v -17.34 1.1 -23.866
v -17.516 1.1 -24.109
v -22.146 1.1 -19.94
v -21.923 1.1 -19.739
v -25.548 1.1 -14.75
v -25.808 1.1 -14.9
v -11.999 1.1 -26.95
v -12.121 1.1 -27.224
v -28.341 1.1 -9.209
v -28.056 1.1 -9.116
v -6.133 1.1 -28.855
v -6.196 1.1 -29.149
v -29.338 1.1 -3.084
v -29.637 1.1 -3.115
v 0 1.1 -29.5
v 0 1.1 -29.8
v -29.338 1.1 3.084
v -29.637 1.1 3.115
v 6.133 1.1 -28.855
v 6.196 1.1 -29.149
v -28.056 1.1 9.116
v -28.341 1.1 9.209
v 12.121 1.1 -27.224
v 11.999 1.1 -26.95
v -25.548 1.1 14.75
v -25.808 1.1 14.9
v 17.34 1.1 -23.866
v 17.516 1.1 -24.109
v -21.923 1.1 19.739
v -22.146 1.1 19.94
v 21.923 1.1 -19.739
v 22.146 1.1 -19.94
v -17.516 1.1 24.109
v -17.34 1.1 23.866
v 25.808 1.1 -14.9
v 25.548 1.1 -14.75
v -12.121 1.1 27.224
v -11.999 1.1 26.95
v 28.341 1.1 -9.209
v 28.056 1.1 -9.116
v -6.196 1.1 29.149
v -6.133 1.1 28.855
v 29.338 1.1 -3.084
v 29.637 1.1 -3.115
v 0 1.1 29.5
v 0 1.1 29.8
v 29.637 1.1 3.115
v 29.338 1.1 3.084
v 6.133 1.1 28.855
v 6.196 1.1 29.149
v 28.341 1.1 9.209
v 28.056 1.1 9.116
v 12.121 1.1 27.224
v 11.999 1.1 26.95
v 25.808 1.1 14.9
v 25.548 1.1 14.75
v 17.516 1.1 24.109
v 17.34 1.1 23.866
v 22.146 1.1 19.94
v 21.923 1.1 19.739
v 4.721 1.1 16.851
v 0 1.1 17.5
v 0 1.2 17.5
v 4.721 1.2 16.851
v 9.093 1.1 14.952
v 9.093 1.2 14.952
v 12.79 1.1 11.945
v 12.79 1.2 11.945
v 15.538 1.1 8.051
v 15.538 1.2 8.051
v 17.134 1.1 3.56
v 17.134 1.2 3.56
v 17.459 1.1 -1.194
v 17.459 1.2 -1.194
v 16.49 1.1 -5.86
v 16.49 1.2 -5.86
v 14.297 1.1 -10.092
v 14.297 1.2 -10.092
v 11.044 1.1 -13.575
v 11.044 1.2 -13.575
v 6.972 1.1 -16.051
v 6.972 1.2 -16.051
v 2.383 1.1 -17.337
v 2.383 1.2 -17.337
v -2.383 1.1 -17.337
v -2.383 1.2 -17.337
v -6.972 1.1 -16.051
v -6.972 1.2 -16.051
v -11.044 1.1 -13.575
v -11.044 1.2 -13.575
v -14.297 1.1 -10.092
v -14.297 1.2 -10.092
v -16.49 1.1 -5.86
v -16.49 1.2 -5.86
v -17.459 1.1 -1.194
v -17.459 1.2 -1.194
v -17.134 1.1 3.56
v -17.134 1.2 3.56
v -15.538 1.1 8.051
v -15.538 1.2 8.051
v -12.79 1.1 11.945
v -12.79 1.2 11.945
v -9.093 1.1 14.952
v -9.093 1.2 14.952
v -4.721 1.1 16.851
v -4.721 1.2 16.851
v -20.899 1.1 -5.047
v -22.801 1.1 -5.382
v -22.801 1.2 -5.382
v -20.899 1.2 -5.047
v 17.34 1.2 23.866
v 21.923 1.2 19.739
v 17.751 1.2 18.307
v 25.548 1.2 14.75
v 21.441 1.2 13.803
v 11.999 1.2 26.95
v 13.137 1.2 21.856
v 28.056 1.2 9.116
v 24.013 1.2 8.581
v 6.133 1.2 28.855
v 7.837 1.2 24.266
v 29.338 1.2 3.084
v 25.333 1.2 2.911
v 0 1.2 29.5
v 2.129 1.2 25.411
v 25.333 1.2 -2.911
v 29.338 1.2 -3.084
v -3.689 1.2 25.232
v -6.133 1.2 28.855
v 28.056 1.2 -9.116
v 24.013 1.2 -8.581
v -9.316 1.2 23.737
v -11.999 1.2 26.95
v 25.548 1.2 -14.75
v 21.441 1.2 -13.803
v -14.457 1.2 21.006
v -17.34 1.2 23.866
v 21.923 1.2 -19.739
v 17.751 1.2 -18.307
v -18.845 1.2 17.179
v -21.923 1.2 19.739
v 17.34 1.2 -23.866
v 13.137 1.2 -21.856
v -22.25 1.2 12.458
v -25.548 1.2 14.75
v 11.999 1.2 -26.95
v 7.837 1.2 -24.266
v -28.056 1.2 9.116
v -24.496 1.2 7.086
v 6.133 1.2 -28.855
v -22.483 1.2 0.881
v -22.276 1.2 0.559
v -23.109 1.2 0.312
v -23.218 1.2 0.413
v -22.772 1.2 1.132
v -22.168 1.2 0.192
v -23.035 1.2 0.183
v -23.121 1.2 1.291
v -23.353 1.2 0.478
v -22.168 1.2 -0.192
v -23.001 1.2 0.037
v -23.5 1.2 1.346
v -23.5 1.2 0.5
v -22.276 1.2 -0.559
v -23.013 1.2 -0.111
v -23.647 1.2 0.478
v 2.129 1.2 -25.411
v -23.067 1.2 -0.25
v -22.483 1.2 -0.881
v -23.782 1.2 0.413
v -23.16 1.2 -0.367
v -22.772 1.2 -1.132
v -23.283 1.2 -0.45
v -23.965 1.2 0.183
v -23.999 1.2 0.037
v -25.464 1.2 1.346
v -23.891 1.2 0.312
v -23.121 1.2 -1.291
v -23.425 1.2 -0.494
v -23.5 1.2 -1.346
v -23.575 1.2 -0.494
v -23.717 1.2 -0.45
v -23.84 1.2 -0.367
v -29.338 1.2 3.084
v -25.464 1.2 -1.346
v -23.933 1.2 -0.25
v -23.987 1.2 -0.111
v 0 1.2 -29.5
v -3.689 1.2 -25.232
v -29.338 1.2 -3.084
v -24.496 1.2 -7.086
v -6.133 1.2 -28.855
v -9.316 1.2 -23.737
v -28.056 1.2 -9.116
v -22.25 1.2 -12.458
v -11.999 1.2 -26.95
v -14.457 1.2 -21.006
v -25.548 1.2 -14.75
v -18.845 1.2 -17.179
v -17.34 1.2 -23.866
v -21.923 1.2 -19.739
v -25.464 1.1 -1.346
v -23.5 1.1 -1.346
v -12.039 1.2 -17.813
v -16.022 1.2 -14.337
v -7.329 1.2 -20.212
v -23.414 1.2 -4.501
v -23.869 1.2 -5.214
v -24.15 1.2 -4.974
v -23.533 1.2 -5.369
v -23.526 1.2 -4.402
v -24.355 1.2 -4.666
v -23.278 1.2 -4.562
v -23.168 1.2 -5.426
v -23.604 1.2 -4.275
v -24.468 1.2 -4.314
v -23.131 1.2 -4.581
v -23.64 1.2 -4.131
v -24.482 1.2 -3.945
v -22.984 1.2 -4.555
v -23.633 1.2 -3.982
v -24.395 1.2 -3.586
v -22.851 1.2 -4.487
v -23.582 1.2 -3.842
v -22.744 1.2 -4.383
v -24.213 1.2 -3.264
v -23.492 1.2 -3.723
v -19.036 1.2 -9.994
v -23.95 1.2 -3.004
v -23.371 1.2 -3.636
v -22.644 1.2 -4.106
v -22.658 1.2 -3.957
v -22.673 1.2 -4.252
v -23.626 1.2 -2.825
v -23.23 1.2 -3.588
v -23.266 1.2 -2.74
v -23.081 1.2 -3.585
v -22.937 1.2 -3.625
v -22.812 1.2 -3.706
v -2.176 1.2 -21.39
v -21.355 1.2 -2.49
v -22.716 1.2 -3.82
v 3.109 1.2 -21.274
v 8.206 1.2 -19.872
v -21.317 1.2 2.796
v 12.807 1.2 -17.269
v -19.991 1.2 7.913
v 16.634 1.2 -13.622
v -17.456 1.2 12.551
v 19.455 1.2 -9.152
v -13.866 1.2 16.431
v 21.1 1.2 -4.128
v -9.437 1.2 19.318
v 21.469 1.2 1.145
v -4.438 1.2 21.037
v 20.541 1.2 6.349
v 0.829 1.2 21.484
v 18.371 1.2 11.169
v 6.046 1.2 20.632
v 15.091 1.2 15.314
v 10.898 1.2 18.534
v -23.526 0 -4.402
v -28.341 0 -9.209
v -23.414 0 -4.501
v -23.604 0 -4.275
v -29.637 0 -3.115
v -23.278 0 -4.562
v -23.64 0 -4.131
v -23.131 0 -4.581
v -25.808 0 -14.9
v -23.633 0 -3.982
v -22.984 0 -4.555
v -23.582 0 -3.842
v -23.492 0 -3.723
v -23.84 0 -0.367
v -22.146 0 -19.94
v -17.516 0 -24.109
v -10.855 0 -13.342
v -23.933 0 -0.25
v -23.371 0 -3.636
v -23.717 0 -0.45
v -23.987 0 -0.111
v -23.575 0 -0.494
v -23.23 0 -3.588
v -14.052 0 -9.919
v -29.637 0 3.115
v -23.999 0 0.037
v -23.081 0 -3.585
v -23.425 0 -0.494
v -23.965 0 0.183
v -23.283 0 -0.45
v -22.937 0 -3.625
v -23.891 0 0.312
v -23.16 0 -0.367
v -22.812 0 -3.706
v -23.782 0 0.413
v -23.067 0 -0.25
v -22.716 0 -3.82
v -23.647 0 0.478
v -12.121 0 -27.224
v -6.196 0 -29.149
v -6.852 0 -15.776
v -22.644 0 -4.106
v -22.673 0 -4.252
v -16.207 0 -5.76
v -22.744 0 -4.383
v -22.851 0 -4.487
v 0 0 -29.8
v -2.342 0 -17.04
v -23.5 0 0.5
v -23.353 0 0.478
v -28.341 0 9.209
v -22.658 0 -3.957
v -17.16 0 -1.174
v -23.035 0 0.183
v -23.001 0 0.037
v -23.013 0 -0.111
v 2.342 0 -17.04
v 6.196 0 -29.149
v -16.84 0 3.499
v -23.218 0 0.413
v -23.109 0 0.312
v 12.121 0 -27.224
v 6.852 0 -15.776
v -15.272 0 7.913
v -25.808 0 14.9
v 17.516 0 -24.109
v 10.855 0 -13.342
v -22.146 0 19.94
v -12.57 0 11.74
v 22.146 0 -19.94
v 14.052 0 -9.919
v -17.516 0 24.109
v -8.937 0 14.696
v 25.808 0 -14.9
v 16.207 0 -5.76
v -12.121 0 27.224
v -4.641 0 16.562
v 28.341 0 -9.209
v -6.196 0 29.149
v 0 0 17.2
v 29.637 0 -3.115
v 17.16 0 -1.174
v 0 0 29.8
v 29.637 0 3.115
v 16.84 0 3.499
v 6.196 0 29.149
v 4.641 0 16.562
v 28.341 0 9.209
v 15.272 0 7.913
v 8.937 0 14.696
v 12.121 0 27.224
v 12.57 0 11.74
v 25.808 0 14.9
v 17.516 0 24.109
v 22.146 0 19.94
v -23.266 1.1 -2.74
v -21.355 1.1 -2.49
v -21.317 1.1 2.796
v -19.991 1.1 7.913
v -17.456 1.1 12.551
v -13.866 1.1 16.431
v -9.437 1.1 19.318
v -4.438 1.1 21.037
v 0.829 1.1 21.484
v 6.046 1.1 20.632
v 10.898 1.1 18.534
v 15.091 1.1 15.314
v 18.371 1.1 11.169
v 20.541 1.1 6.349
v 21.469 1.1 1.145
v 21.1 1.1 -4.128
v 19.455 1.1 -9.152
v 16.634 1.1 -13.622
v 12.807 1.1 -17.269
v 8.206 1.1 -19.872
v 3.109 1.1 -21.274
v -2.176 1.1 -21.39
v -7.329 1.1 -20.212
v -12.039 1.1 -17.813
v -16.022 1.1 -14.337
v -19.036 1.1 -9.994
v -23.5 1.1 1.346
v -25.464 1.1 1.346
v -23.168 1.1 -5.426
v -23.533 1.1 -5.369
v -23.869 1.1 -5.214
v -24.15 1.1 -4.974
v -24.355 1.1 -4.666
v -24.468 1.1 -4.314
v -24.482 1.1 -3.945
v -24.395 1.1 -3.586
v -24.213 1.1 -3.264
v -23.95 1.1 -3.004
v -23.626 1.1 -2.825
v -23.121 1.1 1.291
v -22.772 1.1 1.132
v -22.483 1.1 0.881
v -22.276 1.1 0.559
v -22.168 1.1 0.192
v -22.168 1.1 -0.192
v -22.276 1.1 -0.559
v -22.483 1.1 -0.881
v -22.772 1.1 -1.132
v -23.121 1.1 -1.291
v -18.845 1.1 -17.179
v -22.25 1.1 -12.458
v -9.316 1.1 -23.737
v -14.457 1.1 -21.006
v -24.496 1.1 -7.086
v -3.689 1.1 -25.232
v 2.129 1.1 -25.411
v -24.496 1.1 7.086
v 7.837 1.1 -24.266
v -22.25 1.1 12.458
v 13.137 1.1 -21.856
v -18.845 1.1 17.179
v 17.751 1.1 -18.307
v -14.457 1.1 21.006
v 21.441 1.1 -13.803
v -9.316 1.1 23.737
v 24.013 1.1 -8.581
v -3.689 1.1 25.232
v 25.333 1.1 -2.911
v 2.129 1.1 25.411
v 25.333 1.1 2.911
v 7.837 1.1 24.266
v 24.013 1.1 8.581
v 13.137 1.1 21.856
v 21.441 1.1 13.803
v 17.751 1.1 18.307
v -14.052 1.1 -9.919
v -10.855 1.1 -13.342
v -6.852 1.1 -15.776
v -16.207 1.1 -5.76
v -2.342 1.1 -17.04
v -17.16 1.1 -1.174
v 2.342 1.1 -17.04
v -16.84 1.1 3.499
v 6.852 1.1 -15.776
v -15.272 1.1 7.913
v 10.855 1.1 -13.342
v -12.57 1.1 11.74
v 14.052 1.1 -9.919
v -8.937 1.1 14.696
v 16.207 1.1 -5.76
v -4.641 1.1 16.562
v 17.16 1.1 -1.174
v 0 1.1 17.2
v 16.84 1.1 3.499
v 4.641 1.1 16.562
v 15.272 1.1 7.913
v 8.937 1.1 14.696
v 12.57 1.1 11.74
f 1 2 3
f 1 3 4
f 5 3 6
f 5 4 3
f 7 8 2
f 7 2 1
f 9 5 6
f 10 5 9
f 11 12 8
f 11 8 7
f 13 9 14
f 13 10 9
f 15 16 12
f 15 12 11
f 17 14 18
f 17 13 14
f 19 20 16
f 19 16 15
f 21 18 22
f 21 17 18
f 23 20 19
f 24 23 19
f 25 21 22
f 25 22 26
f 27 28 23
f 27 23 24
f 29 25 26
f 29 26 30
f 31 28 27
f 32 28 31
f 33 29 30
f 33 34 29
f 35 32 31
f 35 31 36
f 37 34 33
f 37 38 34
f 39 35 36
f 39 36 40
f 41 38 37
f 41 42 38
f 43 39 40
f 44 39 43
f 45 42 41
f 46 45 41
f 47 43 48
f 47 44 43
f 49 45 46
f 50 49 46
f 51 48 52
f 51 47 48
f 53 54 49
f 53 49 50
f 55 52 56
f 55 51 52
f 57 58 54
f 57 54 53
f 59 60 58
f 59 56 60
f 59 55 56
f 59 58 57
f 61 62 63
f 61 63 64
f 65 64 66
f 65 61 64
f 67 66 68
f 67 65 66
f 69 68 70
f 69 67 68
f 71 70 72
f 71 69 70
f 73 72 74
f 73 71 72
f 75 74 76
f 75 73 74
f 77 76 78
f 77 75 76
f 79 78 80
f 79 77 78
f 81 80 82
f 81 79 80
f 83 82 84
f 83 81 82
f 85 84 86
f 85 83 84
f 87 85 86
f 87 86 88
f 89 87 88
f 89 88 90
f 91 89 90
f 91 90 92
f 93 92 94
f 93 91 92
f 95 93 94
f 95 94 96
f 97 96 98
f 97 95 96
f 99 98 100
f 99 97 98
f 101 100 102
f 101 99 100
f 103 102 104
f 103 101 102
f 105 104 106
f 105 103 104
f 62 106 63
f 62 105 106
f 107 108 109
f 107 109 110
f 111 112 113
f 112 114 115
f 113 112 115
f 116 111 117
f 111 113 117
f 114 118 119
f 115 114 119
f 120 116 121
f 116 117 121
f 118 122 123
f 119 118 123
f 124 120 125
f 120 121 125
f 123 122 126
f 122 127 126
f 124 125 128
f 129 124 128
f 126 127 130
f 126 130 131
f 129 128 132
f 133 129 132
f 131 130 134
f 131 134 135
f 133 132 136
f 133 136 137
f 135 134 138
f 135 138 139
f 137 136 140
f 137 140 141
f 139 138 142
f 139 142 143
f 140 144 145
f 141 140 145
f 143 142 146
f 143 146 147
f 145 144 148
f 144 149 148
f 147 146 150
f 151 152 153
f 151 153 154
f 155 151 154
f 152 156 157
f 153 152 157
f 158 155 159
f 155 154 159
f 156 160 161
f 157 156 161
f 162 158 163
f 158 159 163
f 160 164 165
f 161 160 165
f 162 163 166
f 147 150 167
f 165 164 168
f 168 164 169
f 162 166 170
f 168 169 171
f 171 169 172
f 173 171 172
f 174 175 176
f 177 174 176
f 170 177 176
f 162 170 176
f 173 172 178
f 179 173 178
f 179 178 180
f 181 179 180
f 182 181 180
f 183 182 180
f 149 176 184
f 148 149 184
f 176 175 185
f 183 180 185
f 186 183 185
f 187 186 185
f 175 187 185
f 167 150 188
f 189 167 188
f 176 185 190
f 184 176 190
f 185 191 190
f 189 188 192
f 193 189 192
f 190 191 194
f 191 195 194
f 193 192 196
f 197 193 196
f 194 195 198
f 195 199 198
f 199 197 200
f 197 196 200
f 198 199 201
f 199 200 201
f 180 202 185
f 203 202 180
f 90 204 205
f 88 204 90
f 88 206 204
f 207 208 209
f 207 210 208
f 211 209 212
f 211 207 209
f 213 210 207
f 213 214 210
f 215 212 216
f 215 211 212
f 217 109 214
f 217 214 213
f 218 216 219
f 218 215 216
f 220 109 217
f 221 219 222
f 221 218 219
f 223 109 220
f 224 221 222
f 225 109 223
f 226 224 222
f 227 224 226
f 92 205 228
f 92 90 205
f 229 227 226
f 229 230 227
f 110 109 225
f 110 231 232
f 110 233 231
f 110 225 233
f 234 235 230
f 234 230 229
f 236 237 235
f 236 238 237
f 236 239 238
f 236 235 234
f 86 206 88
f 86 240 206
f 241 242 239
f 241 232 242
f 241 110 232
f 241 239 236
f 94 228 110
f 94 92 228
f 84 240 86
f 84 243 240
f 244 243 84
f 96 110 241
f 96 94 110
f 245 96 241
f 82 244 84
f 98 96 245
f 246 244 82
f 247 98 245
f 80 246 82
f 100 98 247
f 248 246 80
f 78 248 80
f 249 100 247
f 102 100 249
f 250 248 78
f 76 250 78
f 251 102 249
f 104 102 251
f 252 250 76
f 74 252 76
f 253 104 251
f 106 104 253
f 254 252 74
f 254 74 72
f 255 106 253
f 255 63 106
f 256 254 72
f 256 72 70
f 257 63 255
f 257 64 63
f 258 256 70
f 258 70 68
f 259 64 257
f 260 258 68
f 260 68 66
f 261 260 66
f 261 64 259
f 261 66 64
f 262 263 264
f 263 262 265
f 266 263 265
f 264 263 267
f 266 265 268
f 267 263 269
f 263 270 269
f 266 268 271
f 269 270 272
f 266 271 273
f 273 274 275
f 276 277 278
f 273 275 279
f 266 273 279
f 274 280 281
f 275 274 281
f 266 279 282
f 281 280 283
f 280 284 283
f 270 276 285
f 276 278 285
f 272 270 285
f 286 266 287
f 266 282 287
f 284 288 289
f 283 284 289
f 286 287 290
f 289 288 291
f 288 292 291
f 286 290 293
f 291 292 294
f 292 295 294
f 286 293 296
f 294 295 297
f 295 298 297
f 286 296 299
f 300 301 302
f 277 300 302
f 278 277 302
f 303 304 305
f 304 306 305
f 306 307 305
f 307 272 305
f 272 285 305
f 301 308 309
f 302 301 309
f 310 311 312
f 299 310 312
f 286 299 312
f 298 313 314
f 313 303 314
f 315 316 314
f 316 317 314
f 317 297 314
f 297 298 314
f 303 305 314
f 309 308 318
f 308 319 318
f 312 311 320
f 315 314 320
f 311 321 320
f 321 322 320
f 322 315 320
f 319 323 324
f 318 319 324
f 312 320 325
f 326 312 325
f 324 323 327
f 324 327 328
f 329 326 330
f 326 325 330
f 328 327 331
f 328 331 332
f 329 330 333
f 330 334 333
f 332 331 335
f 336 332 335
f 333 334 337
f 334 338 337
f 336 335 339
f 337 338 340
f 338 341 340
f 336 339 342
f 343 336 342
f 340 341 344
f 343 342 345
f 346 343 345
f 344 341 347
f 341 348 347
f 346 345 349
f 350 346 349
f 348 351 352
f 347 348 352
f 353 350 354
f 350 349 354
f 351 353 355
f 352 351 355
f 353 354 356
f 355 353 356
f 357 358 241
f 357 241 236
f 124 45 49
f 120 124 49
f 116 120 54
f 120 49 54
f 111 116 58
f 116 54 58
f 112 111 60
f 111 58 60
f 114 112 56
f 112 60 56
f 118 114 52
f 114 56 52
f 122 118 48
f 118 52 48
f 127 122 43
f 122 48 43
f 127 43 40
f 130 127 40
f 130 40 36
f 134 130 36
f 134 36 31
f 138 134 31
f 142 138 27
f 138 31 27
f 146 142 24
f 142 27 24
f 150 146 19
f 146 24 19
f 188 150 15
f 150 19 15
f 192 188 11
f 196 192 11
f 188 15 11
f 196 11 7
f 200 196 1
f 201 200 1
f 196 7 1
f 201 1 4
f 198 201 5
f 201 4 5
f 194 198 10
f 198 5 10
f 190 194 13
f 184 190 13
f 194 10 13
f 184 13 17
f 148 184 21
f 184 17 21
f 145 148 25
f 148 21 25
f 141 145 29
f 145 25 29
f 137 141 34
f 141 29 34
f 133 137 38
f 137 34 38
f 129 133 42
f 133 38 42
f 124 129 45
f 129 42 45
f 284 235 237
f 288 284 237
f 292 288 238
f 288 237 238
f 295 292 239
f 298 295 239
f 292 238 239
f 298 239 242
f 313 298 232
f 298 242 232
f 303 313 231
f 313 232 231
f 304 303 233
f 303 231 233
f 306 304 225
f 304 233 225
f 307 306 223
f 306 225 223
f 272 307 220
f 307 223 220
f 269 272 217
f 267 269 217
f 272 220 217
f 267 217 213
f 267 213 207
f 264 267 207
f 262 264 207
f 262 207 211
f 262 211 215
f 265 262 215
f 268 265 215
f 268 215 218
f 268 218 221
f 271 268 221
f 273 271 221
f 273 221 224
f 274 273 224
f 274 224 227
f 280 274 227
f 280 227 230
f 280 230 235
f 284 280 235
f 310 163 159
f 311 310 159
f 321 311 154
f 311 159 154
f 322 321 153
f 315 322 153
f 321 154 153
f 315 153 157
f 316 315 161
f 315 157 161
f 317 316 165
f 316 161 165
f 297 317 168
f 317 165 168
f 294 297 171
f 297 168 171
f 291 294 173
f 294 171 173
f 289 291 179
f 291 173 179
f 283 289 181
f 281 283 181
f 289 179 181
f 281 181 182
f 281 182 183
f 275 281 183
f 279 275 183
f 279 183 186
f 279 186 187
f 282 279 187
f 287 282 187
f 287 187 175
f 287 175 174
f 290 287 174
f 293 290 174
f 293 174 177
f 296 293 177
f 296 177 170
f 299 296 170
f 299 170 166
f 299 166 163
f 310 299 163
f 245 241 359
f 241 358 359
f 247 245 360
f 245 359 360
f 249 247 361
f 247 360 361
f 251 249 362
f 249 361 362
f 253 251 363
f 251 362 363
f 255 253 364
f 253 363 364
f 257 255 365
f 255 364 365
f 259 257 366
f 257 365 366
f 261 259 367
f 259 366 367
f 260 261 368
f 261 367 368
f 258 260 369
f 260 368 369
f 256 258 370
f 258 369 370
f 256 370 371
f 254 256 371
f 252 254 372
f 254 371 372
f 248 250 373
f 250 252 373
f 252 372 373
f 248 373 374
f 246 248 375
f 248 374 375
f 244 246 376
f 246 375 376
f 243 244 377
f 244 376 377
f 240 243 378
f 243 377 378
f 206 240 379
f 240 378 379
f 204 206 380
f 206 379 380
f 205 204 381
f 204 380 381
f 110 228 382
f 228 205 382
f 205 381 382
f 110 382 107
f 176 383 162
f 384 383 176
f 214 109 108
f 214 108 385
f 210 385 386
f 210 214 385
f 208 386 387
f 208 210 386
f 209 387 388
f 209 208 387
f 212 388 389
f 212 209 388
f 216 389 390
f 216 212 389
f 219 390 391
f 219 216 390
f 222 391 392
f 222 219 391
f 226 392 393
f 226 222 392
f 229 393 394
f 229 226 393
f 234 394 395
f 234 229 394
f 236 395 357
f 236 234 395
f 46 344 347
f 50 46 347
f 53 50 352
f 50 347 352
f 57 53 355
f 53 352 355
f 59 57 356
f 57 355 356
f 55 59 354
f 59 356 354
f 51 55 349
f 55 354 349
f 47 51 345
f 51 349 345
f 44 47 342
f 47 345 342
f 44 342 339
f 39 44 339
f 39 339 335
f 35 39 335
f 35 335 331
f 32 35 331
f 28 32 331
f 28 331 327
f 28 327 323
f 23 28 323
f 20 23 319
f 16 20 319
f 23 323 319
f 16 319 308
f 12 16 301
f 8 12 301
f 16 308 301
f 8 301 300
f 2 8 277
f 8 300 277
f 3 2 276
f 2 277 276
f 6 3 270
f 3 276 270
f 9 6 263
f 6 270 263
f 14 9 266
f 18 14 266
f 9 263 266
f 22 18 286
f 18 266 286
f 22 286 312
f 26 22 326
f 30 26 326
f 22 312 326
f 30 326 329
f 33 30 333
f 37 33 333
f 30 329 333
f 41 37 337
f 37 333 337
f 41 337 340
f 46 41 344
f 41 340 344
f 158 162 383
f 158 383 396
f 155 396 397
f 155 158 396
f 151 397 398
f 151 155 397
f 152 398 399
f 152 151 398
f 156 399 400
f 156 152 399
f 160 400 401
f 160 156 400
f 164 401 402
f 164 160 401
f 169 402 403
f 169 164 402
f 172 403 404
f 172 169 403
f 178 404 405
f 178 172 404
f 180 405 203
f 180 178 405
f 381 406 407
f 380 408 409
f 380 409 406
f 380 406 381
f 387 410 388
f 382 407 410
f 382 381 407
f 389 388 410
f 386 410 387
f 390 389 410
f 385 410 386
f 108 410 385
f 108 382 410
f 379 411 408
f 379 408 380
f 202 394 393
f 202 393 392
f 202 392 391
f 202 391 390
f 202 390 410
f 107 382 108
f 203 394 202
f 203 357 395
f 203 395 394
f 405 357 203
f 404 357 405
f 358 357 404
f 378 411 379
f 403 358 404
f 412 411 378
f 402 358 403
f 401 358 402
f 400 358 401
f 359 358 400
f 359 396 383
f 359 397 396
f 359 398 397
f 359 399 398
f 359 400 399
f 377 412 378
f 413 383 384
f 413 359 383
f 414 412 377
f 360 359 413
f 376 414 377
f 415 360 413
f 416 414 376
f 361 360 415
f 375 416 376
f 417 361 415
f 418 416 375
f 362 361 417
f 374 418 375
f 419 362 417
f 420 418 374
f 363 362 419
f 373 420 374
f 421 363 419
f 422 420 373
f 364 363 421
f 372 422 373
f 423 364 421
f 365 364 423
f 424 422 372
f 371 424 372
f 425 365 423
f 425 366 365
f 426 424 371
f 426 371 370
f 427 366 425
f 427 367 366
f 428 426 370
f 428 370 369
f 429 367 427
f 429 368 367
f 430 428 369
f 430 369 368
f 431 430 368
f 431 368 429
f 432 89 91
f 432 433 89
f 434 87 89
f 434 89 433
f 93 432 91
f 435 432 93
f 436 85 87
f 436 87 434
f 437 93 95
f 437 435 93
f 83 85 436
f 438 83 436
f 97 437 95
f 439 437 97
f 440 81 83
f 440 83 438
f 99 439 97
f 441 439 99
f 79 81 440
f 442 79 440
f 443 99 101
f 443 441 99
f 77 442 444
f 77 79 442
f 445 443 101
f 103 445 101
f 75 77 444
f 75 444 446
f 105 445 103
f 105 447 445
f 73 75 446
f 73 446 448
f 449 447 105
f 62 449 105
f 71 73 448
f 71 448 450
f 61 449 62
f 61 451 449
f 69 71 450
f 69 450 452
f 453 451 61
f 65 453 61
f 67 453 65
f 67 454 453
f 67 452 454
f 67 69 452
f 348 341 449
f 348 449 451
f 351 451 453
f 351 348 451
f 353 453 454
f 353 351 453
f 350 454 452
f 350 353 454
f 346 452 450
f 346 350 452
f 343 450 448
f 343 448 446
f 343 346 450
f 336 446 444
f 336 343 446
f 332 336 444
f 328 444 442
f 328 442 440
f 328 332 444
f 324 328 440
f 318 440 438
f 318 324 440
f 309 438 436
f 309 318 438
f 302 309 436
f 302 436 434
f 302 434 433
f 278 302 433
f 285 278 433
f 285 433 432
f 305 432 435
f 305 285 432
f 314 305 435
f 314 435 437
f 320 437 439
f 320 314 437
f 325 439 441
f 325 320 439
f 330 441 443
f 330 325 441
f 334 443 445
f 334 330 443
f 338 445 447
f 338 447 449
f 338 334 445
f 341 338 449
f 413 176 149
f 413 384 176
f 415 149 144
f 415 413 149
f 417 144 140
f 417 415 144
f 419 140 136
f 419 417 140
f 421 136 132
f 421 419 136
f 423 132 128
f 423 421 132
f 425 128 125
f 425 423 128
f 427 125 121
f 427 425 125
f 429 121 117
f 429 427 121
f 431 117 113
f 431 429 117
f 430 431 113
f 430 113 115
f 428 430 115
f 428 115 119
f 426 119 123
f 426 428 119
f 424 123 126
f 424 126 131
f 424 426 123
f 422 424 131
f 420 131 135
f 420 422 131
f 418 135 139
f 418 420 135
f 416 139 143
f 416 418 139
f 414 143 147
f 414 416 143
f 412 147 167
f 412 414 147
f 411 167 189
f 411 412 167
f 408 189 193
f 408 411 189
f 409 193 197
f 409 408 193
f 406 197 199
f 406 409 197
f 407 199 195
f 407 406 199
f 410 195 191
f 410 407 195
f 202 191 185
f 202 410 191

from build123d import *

# Parameters (mm, degrees)
SKETCH_1_R               = 29.8
SKETCH_1_R_2             = 17.2
EXTRUDE_1_DEPTH          = 1.1
SKETCH_2_R               = 29.5
SKETCH_2_R_2             = 25.5
SKETCH_2_R_3             = 21.5
SKETCH_2_R_4             = 17.5
EXTRUDE_2_DEPTH          = 0.1
SKETCH_4_R               = 0.5
CUT_EXTRUDE_1_DEPTH      = 43.157917406
EXTRUDE_START            = 0.1
SKETCH_5_R               = 1.345948063
SKETCH_5_R_2             = 0.5
EXTRUDE_3_DEPTH          = 0.1
PATTERN_CIRCULAR_1_COUNT = 2
PATTERN_CIRCULAR_1_ANGLE = 10
EXTRUDE_4_DEPTH          = 0.1


with BuildPart() as part:
    # Эскиз1 → Бобышка-Вытянуть1 (new body)
    with BuildSketch(Plane(origin=(0, 0, 0), x_dir=(1, 0, 0), z_dir=(0, 1, 0))):
        with Locations(Location((0, 0, 0), (0, 0, 270))):
            Circle(SKETCH_1_R)
        with Locations(Location((0, 0, 0), (0, 0, 270))):
            Circle(SKETCH_1_R_2, mode=Mode.SUBTRACT)
    extrude(amount=EXTRUDE_1_DEPTH)

    # Эскиз2 → Бобышка-Вытянуть2 (add)
    # profile 1 of 2: a face of its own
    with BuildSketch(Plane(origin=(0, 1.1, 0), x_dir=(1, 0, 0), z_dir=(0, 1, 0))):
        with Locations(Location((0, 0, 0), (0, 0, 270))):
            Circle(SKETCH_2_R)
        with Locations(Location((0, 0, 0), (0, 0, 270))):
            Circle(SKETCH_2_R_2, mode=Mode.SUBTRACT)
    # profile 2 of 2: a face of its own
    with BuildSketch(Plane(origin=(0, 1.1, 0), x_dir=(1, 0, 0), z_dir=(0, 1, 0))):
        with Locations(Location((0, 0, 0), (0, 0, 270))):
            Circle(SKETCH_2_R_3)
        with Locations(Location((0, 0, 0), (0, 0, 270))):
            Circle(SKETCH_2_R_4, mode=Mode.SUBTRACT)
    extrude(amount=EXTRUDE_2_DEPTH)

    # Эскиз4 → Вырез-Вытянуть1 (cut, through all)
    with BuildSketch(Plane(origin=(0, 1.1, 0), x_dir=(1, 0, 0), z_dir=(0, 1, 0))):
        with Locations(Location((-23.5, 0, 0), (0, 0, 270))):
            Circle(SKETCH_4_R)
    cut_extrude_1 = extrude(amount=-CUT_EXTRUDE_1_DEPTH, mode=Mode.SUBTRACT)

    # Эскиз5 → Бобышка-Вытянуть3 (add)
    with BuildSketch(Plane(origin=(0, 1.1, 0), x_dir=(1, 0, 0), z_dir=(0, 1, 0)).offset(EXTRUDE_START)):
        with Locations(Location((-23.5, 0, 0), (0, 0, 270))):
            Circle(SKETCH_5_R)
        with Locations(Location((-23.5, 0, 0), (0, 0, 270))):
            Circle(SKETCH_5_R_2, mode=Mode.SUBTRACT)
    extrude_3 = extrude(amount=-EXTRUDE_3_DEPTH)

    # Круговой массив1: Вырез-Вытянуть1, Бобышка-Вытянуть3 ×2 about axis
    pattern_circular_1_axis = Axis((0, 1.1, 0), (0, -1, 0))
    add([cut_extrude_1.rotate(pattern_circular_1_axis, i * PATTERN_CIRCULAR_1_ANGLE / (PATTERN_CIRCULAR_1_COUNT - 1)) for i in range(1, PATTERN_CIRCULAR_1_COUNT)], mode=Mode.SUBTRACT)
    add([extrude_3.rotate(pattern_circular_1_axis, i * PATTERN_CIRCULAR_1_ANGLE / (PATTERN_CIRCULAR_1_COUNT - 1)) for i in range(1, PATTERN_CIRCULAR_1_COUNT)])

    # Эскиз6 → Бобышка-Вытянуть4 (add)
    with BuildSketch(Plane(origin=(0, 1.1, 0), x_dir=(1, 0, 0), z_dir=(0, 1, 0))):
        with BuildLine():
            Line((-22.800516228, 5.382382378), (-20.899198346, 5.047128736))
            ThreePointArc((-20.899198346, 5.047128736), (-21.165886934, 3.775609923), (-21.355289338, 2.490304658))
            Line((-21.355289338, 2.490304658), (-23.266360042, 2.740450826))
            ThreePointArc((-23.266360042, 2.740450826), (-21.817482108, 3.847010747), (-22.800516228, 5.382382378))
        make_face()
        Polygon((-23.5, -1.345948063), (-27.456522895, -1.345948063), (-27.456522895, 1.345948063), (-23.5, 1.345948063), (-24.412849666, 0), align=None)
    extrude(amount=EXTRUDE_4_DEPTH)


solid = part.part
